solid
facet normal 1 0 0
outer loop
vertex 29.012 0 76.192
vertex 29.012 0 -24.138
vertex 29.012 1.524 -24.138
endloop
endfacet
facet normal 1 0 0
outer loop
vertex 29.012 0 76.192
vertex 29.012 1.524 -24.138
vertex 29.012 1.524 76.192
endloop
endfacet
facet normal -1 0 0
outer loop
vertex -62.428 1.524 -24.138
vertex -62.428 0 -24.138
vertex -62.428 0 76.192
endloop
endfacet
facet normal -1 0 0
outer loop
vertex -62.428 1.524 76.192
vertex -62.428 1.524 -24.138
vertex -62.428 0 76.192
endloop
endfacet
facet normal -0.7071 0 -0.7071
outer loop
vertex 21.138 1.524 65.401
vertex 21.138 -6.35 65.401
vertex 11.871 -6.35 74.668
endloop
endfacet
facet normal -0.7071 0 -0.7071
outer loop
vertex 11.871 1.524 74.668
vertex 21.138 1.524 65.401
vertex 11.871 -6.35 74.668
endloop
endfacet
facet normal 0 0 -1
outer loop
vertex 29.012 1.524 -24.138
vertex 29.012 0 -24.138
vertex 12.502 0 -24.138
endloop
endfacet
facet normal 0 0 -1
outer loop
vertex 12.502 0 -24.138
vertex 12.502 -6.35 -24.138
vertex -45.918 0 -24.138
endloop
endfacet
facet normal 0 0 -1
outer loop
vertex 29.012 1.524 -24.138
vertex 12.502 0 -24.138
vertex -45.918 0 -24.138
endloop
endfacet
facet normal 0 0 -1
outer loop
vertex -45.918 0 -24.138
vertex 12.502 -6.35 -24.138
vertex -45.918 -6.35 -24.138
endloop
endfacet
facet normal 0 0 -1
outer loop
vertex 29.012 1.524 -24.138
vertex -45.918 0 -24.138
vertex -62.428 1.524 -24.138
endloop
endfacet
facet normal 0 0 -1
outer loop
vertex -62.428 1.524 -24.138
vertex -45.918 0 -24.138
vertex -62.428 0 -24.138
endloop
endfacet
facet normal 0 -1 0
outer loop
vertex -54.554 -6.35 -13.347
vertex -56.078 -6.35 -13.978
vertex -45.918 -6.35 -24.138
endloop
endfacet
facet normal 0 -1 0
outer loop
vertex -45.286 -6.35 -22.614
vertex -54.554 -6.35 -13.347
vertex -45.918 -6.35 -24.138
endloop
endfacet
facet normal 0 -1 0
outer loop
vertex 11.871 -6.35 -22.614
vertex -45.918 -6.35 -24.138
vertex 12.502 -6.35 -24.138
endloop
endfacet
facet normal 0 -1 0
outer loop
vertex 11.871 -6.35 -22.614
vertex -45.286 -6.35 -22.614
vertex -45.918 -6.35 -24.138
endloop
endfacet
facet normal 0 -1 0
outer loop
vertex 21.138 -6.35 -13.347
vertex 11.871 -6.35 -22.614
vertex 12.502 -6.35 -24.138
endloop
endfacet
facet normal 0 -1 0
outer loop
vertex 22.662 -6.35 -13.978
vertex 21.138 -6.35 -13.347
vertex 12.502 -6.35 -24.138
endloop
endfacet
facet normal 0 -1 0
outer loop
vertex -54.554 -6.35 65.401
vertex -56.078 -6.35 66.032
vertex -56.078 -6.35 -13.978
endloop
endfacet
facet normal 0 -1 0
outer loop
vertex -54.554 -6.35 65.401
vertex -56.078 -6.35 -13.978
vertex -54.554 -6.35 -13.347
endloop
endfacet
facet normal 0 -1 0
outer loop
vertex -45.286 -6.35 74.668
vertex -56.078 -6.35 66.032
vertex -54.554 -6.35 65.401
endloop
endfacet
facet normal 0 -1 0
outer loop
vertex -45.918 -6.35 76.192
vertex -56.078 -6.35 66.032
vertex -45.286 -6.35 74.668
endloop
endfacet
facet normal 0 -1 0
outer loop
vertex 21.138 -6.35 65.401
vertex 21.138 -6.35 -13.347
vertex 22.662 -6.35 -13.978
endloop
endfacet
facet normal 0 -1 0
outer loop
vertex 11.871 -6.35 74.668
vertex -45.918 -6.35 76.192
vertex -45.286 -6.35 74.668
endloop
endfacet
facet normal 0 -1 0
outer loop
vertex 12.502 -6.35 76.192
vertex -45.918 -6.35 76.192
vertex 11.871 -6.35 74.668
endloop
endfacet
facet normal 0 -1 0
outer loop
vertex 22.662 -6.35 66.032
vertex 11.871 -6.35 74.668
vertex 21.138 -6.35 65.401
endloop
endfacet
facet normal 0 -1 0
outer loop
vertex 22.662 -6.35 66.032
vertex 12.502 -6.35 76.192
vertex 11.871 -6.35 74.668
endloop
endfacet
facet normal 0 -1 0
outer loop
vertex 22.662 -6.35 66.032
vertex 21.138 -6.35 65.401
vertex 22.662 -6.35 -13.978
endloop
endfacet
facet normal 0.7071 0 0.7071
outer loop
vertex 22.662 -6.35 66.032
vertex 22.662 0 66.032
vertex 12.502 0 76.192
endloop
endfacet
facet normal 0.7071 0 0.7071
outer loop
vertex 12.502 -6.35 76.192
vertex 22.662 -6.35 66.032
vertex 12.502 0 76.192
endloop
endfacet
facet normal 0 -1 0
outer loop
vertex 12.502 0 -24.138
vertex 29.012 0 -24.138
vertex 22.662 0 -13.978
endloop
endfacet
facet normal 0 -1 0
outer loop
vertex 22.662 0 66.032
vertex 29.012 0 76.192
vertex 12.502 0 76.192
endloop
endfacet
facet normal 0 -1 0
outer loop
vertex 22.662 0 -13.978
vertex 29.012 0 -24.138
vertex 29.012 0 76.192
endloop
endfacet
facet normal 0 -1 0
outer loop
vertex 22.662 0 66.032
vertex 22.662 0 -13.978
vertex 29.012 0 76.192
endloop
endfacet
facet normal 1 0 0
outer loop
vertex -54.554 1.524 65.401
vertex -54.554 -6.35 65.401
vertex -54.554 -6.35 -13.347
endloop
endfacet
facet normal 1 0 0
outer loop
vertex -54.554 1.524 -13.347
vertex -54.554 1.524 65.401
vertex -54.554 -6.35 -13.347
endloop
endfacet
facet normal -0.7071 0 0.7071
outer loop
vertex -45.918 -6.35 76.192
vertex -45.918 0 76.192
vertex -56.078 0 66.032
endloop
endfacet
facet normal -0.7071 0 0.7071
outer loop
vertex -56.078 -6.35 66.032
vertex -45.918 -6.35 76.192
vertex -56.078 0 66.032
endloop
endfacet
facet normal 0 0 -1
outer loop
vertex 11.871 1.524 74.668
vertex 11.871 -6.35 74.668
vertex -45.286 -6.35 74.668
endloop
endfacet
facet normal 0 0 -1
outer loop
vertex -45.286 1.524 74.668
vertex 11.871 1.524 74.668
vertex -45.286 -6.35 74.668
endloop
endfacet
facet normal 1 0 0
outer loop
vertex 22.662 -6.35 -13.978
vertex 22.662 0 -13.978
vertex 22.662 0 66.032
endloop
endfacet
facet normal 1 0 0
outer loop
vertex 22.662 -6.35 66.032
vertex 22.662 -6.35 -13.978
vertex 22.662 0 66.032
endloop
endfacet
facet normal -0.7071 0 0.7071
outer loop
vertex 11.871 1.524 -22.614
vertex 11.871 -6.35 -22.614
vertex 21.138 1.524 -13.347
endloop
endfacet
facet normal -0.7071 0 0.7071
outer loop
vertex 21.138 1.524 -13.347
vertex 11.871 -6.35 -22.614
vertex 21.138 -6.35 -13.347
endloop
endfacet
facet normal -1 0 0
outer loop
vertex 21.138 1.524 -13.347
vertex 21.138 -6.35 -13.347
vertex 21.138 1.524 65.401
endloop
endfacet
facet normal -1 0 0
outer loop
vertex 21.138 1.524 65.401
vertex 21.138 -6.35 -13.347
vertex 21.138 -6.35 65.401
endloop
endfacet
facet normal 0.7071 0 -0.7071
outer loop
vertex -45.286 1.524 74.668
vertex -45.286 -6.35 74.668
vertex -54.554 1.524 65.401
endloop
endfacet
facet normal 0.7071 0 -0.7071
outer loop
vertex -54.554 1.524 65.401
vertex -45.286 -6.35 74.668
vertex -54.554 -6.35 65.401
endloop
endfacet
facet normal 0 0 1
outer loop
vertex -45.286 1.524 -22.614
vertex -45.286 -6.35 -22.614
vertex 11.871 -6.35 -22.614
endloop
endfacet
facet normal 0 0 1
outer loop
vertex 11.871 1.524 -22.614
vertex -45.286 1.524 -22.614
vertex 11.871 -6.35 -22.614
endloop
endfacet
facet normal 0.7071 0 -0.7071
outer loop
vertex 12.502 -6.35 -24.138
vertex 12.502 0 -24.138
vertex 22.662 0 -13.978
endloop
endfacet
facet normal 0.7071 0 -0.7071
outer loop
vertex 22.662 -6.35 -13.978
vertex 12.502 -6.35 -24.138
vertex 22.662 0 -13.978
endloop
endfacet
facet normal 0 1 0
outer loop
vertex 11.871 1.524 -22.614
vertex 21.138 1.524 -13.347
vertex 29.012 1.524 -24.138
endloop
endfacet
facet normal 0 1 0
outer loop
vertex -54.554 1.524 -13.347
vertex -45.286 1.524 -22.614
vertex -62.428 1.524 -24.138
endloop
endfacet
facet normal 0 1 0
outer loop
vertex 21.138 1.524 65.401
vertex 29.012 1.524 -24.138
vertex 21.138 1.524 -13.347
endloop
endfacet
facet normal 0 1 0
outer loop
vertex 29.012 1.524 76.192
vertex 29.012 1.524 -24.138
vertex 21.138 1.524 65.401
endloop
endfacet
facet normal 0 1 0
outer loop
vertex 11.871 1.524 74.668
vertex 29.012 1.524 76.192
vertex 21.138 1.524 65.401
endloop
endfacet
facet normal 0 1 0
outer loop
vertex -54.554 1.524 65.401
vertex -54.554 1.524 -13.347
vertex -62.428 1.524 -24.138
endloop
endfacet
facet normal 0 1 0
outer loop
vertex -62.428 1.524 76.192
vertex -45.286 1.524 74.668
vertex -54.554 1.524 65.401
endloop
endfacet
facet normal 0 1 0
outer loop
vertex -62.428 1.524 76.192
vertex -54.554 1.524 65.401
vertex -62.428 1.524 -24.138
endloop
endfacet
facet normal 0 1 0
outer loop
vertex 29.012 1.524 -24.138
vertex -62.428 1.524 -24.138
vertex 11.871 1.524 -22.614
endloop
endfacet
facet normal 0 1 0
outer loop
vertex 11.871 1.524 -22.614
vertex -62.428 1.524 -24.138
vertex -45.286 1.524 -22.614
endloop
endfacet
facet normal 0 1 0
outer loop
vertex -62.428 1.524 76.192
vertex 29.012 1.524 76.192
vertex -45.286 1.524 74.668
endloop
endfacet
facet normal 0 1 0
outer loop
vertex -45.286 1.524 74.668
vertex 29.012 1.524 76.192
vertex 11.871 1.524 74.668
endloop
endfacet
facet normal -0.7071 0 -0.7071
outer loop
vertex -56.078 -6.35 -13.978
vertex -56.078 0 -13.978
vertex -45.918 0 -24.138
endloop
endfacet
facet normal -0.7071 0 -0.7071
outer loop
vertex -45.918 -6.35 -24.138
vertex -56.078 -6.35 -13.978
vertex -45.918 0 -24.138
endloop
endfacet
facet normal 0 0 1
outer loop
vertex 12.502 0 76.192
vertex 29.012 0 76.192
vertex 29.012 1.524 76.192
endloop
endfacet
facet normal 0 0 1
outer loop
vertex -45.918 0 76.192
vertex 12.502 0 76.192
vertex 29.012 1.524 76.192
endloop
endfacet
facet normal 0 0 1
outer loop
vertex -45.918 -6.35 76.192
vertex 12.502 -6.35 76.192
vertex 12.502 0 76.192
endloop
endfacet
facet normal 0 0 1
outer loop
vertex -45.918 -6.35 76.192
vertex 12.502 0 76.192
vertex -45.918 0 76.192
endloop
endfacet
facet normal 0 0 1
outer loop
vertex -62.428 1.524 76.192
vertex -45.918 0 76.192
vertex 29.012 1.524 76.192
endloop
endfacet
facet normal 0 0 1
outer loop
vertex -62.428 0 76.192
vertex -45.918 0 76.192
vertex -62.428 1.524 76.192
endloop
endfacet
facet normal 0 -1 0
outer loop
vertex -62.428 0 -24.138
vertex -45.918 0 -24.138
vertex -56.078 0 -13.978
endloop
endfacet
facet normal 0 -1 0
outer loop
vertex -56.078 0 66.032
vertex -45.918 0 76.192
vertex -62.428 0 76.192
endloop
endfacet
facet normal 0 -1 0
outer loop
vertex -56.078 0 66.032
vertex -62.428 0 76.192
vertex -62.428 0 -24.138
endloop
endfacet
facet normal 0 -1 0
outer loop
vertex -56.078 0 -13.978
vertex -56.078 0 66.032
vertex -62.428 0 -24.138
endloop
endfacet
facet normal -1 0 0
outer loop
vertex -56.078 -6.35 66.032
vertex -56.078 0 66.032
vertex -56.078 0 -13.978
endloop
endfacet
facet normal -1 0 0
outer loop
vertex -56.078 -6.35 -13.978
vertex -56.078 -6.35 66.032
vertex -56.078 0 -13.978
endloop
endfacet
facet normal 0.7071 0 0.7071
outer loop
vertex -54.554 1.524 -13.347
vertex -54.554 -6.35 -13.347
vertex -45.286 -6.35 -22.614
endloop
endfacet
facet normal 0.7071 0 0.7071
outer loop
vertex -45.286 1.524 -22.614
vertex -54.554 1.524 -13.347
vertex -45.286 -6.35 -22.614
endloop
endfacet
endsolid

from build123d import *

# Parameters (mm, degrees)
F1_DEPTH = 6.35
F2_W     = 91.44
F2_H     = 100.33
F3_DEPTH = 1.524
F5_DEPTH = 5.334
F6_DEPTH = 6.35


with BuildPart() as f1:
    # F0 (on Front) → F1 (new body)
    with BuildSketch(Plane.XZ):
        Polygon((12.5022814354, 76.191857674), (-45.9177185646, 76.191857674), (-56.0777185646, 66.031857674), (-56.0777185646, -13.978142326), (-45.9177185646, -24.138142326), (12.5022814354, -24.138142326), (22.6622814354, -13.978142326), (22.6622814354, 66.031857674), align=None)
        Polygon((-54.5537185646, 65.4005962049), (-45.2864570956, 74.667857674), (11.8710199663, 74.667857674), (21.1382814354, 65.4005962049), (21.1382814354, -13.346880857), (11.8710199663, -22.614142326), (-45.2864570956, -22.614142326), (-54.5537185646, -13.346880857), align=None, mode=Mode.SUBTRACT)
    extrude(amount=F1_DEPTH)

    # F2 (on face) → F3 (join)
    with BuildSketch(Plane(origin=(0, 0, 0), x_dir=(-1, 0, 0), z_dir=(0, 1, 0))):
        with Locations((16.7077185646, 26.026857674)):
            Rectangle(F2_W, F2_H)
    extrude(amount=F3_DEPTH)

    # F4 (on face) → F5 (cut, symmetric)
    with BuildSketch(Plane.XZ):
        Polygon((11.8710199663, 74.667857674), (-45.2864570956, 74.667857674), (-54.5537185646, 65.4005962049), (-54.5537185646, -13.346880857), (-45.2864570956, -22.614142326), (11.8710199663, -22.614142326), (21.1382814354, -13.346880857), (21.1382814354, 65.4005962049), align=None)
    extrude(amount=F5_DEPTH, both=True, mode=Mode.SUBTRACT)

    # F0 (on Front) → F6 (join)
    with BuildSketch(Plane.XZ):
        Polygon((12.5022814354, 76.191857674), (-45.9177185646, 76.191857674), (-56.0777185646, 66.031857674), (-56.0777185646, -13.978142326), (-45.9177185646, -24.138142326), (12.5022814354, -24.138142326), (22.6622814354, -13.978142326), (22.6622814354, 66.031857674), align=None)
        Polygon((-54.5537185646, 65.4005962049), (-45.2864570956, 74.667857674), (11.8710199663, 74.667857674), (21.1382814354, 65.4005962049), (21.1382814354, -13.346880857), (11.8710199663, -22.614142326), (-45.2864570956, -22.614142326), (-54.5537185646, -13.346880857), align=None, mode=Mode.SUBTRACT)
    extrude(amount=F6_DEPTH)


solid = f1.part
